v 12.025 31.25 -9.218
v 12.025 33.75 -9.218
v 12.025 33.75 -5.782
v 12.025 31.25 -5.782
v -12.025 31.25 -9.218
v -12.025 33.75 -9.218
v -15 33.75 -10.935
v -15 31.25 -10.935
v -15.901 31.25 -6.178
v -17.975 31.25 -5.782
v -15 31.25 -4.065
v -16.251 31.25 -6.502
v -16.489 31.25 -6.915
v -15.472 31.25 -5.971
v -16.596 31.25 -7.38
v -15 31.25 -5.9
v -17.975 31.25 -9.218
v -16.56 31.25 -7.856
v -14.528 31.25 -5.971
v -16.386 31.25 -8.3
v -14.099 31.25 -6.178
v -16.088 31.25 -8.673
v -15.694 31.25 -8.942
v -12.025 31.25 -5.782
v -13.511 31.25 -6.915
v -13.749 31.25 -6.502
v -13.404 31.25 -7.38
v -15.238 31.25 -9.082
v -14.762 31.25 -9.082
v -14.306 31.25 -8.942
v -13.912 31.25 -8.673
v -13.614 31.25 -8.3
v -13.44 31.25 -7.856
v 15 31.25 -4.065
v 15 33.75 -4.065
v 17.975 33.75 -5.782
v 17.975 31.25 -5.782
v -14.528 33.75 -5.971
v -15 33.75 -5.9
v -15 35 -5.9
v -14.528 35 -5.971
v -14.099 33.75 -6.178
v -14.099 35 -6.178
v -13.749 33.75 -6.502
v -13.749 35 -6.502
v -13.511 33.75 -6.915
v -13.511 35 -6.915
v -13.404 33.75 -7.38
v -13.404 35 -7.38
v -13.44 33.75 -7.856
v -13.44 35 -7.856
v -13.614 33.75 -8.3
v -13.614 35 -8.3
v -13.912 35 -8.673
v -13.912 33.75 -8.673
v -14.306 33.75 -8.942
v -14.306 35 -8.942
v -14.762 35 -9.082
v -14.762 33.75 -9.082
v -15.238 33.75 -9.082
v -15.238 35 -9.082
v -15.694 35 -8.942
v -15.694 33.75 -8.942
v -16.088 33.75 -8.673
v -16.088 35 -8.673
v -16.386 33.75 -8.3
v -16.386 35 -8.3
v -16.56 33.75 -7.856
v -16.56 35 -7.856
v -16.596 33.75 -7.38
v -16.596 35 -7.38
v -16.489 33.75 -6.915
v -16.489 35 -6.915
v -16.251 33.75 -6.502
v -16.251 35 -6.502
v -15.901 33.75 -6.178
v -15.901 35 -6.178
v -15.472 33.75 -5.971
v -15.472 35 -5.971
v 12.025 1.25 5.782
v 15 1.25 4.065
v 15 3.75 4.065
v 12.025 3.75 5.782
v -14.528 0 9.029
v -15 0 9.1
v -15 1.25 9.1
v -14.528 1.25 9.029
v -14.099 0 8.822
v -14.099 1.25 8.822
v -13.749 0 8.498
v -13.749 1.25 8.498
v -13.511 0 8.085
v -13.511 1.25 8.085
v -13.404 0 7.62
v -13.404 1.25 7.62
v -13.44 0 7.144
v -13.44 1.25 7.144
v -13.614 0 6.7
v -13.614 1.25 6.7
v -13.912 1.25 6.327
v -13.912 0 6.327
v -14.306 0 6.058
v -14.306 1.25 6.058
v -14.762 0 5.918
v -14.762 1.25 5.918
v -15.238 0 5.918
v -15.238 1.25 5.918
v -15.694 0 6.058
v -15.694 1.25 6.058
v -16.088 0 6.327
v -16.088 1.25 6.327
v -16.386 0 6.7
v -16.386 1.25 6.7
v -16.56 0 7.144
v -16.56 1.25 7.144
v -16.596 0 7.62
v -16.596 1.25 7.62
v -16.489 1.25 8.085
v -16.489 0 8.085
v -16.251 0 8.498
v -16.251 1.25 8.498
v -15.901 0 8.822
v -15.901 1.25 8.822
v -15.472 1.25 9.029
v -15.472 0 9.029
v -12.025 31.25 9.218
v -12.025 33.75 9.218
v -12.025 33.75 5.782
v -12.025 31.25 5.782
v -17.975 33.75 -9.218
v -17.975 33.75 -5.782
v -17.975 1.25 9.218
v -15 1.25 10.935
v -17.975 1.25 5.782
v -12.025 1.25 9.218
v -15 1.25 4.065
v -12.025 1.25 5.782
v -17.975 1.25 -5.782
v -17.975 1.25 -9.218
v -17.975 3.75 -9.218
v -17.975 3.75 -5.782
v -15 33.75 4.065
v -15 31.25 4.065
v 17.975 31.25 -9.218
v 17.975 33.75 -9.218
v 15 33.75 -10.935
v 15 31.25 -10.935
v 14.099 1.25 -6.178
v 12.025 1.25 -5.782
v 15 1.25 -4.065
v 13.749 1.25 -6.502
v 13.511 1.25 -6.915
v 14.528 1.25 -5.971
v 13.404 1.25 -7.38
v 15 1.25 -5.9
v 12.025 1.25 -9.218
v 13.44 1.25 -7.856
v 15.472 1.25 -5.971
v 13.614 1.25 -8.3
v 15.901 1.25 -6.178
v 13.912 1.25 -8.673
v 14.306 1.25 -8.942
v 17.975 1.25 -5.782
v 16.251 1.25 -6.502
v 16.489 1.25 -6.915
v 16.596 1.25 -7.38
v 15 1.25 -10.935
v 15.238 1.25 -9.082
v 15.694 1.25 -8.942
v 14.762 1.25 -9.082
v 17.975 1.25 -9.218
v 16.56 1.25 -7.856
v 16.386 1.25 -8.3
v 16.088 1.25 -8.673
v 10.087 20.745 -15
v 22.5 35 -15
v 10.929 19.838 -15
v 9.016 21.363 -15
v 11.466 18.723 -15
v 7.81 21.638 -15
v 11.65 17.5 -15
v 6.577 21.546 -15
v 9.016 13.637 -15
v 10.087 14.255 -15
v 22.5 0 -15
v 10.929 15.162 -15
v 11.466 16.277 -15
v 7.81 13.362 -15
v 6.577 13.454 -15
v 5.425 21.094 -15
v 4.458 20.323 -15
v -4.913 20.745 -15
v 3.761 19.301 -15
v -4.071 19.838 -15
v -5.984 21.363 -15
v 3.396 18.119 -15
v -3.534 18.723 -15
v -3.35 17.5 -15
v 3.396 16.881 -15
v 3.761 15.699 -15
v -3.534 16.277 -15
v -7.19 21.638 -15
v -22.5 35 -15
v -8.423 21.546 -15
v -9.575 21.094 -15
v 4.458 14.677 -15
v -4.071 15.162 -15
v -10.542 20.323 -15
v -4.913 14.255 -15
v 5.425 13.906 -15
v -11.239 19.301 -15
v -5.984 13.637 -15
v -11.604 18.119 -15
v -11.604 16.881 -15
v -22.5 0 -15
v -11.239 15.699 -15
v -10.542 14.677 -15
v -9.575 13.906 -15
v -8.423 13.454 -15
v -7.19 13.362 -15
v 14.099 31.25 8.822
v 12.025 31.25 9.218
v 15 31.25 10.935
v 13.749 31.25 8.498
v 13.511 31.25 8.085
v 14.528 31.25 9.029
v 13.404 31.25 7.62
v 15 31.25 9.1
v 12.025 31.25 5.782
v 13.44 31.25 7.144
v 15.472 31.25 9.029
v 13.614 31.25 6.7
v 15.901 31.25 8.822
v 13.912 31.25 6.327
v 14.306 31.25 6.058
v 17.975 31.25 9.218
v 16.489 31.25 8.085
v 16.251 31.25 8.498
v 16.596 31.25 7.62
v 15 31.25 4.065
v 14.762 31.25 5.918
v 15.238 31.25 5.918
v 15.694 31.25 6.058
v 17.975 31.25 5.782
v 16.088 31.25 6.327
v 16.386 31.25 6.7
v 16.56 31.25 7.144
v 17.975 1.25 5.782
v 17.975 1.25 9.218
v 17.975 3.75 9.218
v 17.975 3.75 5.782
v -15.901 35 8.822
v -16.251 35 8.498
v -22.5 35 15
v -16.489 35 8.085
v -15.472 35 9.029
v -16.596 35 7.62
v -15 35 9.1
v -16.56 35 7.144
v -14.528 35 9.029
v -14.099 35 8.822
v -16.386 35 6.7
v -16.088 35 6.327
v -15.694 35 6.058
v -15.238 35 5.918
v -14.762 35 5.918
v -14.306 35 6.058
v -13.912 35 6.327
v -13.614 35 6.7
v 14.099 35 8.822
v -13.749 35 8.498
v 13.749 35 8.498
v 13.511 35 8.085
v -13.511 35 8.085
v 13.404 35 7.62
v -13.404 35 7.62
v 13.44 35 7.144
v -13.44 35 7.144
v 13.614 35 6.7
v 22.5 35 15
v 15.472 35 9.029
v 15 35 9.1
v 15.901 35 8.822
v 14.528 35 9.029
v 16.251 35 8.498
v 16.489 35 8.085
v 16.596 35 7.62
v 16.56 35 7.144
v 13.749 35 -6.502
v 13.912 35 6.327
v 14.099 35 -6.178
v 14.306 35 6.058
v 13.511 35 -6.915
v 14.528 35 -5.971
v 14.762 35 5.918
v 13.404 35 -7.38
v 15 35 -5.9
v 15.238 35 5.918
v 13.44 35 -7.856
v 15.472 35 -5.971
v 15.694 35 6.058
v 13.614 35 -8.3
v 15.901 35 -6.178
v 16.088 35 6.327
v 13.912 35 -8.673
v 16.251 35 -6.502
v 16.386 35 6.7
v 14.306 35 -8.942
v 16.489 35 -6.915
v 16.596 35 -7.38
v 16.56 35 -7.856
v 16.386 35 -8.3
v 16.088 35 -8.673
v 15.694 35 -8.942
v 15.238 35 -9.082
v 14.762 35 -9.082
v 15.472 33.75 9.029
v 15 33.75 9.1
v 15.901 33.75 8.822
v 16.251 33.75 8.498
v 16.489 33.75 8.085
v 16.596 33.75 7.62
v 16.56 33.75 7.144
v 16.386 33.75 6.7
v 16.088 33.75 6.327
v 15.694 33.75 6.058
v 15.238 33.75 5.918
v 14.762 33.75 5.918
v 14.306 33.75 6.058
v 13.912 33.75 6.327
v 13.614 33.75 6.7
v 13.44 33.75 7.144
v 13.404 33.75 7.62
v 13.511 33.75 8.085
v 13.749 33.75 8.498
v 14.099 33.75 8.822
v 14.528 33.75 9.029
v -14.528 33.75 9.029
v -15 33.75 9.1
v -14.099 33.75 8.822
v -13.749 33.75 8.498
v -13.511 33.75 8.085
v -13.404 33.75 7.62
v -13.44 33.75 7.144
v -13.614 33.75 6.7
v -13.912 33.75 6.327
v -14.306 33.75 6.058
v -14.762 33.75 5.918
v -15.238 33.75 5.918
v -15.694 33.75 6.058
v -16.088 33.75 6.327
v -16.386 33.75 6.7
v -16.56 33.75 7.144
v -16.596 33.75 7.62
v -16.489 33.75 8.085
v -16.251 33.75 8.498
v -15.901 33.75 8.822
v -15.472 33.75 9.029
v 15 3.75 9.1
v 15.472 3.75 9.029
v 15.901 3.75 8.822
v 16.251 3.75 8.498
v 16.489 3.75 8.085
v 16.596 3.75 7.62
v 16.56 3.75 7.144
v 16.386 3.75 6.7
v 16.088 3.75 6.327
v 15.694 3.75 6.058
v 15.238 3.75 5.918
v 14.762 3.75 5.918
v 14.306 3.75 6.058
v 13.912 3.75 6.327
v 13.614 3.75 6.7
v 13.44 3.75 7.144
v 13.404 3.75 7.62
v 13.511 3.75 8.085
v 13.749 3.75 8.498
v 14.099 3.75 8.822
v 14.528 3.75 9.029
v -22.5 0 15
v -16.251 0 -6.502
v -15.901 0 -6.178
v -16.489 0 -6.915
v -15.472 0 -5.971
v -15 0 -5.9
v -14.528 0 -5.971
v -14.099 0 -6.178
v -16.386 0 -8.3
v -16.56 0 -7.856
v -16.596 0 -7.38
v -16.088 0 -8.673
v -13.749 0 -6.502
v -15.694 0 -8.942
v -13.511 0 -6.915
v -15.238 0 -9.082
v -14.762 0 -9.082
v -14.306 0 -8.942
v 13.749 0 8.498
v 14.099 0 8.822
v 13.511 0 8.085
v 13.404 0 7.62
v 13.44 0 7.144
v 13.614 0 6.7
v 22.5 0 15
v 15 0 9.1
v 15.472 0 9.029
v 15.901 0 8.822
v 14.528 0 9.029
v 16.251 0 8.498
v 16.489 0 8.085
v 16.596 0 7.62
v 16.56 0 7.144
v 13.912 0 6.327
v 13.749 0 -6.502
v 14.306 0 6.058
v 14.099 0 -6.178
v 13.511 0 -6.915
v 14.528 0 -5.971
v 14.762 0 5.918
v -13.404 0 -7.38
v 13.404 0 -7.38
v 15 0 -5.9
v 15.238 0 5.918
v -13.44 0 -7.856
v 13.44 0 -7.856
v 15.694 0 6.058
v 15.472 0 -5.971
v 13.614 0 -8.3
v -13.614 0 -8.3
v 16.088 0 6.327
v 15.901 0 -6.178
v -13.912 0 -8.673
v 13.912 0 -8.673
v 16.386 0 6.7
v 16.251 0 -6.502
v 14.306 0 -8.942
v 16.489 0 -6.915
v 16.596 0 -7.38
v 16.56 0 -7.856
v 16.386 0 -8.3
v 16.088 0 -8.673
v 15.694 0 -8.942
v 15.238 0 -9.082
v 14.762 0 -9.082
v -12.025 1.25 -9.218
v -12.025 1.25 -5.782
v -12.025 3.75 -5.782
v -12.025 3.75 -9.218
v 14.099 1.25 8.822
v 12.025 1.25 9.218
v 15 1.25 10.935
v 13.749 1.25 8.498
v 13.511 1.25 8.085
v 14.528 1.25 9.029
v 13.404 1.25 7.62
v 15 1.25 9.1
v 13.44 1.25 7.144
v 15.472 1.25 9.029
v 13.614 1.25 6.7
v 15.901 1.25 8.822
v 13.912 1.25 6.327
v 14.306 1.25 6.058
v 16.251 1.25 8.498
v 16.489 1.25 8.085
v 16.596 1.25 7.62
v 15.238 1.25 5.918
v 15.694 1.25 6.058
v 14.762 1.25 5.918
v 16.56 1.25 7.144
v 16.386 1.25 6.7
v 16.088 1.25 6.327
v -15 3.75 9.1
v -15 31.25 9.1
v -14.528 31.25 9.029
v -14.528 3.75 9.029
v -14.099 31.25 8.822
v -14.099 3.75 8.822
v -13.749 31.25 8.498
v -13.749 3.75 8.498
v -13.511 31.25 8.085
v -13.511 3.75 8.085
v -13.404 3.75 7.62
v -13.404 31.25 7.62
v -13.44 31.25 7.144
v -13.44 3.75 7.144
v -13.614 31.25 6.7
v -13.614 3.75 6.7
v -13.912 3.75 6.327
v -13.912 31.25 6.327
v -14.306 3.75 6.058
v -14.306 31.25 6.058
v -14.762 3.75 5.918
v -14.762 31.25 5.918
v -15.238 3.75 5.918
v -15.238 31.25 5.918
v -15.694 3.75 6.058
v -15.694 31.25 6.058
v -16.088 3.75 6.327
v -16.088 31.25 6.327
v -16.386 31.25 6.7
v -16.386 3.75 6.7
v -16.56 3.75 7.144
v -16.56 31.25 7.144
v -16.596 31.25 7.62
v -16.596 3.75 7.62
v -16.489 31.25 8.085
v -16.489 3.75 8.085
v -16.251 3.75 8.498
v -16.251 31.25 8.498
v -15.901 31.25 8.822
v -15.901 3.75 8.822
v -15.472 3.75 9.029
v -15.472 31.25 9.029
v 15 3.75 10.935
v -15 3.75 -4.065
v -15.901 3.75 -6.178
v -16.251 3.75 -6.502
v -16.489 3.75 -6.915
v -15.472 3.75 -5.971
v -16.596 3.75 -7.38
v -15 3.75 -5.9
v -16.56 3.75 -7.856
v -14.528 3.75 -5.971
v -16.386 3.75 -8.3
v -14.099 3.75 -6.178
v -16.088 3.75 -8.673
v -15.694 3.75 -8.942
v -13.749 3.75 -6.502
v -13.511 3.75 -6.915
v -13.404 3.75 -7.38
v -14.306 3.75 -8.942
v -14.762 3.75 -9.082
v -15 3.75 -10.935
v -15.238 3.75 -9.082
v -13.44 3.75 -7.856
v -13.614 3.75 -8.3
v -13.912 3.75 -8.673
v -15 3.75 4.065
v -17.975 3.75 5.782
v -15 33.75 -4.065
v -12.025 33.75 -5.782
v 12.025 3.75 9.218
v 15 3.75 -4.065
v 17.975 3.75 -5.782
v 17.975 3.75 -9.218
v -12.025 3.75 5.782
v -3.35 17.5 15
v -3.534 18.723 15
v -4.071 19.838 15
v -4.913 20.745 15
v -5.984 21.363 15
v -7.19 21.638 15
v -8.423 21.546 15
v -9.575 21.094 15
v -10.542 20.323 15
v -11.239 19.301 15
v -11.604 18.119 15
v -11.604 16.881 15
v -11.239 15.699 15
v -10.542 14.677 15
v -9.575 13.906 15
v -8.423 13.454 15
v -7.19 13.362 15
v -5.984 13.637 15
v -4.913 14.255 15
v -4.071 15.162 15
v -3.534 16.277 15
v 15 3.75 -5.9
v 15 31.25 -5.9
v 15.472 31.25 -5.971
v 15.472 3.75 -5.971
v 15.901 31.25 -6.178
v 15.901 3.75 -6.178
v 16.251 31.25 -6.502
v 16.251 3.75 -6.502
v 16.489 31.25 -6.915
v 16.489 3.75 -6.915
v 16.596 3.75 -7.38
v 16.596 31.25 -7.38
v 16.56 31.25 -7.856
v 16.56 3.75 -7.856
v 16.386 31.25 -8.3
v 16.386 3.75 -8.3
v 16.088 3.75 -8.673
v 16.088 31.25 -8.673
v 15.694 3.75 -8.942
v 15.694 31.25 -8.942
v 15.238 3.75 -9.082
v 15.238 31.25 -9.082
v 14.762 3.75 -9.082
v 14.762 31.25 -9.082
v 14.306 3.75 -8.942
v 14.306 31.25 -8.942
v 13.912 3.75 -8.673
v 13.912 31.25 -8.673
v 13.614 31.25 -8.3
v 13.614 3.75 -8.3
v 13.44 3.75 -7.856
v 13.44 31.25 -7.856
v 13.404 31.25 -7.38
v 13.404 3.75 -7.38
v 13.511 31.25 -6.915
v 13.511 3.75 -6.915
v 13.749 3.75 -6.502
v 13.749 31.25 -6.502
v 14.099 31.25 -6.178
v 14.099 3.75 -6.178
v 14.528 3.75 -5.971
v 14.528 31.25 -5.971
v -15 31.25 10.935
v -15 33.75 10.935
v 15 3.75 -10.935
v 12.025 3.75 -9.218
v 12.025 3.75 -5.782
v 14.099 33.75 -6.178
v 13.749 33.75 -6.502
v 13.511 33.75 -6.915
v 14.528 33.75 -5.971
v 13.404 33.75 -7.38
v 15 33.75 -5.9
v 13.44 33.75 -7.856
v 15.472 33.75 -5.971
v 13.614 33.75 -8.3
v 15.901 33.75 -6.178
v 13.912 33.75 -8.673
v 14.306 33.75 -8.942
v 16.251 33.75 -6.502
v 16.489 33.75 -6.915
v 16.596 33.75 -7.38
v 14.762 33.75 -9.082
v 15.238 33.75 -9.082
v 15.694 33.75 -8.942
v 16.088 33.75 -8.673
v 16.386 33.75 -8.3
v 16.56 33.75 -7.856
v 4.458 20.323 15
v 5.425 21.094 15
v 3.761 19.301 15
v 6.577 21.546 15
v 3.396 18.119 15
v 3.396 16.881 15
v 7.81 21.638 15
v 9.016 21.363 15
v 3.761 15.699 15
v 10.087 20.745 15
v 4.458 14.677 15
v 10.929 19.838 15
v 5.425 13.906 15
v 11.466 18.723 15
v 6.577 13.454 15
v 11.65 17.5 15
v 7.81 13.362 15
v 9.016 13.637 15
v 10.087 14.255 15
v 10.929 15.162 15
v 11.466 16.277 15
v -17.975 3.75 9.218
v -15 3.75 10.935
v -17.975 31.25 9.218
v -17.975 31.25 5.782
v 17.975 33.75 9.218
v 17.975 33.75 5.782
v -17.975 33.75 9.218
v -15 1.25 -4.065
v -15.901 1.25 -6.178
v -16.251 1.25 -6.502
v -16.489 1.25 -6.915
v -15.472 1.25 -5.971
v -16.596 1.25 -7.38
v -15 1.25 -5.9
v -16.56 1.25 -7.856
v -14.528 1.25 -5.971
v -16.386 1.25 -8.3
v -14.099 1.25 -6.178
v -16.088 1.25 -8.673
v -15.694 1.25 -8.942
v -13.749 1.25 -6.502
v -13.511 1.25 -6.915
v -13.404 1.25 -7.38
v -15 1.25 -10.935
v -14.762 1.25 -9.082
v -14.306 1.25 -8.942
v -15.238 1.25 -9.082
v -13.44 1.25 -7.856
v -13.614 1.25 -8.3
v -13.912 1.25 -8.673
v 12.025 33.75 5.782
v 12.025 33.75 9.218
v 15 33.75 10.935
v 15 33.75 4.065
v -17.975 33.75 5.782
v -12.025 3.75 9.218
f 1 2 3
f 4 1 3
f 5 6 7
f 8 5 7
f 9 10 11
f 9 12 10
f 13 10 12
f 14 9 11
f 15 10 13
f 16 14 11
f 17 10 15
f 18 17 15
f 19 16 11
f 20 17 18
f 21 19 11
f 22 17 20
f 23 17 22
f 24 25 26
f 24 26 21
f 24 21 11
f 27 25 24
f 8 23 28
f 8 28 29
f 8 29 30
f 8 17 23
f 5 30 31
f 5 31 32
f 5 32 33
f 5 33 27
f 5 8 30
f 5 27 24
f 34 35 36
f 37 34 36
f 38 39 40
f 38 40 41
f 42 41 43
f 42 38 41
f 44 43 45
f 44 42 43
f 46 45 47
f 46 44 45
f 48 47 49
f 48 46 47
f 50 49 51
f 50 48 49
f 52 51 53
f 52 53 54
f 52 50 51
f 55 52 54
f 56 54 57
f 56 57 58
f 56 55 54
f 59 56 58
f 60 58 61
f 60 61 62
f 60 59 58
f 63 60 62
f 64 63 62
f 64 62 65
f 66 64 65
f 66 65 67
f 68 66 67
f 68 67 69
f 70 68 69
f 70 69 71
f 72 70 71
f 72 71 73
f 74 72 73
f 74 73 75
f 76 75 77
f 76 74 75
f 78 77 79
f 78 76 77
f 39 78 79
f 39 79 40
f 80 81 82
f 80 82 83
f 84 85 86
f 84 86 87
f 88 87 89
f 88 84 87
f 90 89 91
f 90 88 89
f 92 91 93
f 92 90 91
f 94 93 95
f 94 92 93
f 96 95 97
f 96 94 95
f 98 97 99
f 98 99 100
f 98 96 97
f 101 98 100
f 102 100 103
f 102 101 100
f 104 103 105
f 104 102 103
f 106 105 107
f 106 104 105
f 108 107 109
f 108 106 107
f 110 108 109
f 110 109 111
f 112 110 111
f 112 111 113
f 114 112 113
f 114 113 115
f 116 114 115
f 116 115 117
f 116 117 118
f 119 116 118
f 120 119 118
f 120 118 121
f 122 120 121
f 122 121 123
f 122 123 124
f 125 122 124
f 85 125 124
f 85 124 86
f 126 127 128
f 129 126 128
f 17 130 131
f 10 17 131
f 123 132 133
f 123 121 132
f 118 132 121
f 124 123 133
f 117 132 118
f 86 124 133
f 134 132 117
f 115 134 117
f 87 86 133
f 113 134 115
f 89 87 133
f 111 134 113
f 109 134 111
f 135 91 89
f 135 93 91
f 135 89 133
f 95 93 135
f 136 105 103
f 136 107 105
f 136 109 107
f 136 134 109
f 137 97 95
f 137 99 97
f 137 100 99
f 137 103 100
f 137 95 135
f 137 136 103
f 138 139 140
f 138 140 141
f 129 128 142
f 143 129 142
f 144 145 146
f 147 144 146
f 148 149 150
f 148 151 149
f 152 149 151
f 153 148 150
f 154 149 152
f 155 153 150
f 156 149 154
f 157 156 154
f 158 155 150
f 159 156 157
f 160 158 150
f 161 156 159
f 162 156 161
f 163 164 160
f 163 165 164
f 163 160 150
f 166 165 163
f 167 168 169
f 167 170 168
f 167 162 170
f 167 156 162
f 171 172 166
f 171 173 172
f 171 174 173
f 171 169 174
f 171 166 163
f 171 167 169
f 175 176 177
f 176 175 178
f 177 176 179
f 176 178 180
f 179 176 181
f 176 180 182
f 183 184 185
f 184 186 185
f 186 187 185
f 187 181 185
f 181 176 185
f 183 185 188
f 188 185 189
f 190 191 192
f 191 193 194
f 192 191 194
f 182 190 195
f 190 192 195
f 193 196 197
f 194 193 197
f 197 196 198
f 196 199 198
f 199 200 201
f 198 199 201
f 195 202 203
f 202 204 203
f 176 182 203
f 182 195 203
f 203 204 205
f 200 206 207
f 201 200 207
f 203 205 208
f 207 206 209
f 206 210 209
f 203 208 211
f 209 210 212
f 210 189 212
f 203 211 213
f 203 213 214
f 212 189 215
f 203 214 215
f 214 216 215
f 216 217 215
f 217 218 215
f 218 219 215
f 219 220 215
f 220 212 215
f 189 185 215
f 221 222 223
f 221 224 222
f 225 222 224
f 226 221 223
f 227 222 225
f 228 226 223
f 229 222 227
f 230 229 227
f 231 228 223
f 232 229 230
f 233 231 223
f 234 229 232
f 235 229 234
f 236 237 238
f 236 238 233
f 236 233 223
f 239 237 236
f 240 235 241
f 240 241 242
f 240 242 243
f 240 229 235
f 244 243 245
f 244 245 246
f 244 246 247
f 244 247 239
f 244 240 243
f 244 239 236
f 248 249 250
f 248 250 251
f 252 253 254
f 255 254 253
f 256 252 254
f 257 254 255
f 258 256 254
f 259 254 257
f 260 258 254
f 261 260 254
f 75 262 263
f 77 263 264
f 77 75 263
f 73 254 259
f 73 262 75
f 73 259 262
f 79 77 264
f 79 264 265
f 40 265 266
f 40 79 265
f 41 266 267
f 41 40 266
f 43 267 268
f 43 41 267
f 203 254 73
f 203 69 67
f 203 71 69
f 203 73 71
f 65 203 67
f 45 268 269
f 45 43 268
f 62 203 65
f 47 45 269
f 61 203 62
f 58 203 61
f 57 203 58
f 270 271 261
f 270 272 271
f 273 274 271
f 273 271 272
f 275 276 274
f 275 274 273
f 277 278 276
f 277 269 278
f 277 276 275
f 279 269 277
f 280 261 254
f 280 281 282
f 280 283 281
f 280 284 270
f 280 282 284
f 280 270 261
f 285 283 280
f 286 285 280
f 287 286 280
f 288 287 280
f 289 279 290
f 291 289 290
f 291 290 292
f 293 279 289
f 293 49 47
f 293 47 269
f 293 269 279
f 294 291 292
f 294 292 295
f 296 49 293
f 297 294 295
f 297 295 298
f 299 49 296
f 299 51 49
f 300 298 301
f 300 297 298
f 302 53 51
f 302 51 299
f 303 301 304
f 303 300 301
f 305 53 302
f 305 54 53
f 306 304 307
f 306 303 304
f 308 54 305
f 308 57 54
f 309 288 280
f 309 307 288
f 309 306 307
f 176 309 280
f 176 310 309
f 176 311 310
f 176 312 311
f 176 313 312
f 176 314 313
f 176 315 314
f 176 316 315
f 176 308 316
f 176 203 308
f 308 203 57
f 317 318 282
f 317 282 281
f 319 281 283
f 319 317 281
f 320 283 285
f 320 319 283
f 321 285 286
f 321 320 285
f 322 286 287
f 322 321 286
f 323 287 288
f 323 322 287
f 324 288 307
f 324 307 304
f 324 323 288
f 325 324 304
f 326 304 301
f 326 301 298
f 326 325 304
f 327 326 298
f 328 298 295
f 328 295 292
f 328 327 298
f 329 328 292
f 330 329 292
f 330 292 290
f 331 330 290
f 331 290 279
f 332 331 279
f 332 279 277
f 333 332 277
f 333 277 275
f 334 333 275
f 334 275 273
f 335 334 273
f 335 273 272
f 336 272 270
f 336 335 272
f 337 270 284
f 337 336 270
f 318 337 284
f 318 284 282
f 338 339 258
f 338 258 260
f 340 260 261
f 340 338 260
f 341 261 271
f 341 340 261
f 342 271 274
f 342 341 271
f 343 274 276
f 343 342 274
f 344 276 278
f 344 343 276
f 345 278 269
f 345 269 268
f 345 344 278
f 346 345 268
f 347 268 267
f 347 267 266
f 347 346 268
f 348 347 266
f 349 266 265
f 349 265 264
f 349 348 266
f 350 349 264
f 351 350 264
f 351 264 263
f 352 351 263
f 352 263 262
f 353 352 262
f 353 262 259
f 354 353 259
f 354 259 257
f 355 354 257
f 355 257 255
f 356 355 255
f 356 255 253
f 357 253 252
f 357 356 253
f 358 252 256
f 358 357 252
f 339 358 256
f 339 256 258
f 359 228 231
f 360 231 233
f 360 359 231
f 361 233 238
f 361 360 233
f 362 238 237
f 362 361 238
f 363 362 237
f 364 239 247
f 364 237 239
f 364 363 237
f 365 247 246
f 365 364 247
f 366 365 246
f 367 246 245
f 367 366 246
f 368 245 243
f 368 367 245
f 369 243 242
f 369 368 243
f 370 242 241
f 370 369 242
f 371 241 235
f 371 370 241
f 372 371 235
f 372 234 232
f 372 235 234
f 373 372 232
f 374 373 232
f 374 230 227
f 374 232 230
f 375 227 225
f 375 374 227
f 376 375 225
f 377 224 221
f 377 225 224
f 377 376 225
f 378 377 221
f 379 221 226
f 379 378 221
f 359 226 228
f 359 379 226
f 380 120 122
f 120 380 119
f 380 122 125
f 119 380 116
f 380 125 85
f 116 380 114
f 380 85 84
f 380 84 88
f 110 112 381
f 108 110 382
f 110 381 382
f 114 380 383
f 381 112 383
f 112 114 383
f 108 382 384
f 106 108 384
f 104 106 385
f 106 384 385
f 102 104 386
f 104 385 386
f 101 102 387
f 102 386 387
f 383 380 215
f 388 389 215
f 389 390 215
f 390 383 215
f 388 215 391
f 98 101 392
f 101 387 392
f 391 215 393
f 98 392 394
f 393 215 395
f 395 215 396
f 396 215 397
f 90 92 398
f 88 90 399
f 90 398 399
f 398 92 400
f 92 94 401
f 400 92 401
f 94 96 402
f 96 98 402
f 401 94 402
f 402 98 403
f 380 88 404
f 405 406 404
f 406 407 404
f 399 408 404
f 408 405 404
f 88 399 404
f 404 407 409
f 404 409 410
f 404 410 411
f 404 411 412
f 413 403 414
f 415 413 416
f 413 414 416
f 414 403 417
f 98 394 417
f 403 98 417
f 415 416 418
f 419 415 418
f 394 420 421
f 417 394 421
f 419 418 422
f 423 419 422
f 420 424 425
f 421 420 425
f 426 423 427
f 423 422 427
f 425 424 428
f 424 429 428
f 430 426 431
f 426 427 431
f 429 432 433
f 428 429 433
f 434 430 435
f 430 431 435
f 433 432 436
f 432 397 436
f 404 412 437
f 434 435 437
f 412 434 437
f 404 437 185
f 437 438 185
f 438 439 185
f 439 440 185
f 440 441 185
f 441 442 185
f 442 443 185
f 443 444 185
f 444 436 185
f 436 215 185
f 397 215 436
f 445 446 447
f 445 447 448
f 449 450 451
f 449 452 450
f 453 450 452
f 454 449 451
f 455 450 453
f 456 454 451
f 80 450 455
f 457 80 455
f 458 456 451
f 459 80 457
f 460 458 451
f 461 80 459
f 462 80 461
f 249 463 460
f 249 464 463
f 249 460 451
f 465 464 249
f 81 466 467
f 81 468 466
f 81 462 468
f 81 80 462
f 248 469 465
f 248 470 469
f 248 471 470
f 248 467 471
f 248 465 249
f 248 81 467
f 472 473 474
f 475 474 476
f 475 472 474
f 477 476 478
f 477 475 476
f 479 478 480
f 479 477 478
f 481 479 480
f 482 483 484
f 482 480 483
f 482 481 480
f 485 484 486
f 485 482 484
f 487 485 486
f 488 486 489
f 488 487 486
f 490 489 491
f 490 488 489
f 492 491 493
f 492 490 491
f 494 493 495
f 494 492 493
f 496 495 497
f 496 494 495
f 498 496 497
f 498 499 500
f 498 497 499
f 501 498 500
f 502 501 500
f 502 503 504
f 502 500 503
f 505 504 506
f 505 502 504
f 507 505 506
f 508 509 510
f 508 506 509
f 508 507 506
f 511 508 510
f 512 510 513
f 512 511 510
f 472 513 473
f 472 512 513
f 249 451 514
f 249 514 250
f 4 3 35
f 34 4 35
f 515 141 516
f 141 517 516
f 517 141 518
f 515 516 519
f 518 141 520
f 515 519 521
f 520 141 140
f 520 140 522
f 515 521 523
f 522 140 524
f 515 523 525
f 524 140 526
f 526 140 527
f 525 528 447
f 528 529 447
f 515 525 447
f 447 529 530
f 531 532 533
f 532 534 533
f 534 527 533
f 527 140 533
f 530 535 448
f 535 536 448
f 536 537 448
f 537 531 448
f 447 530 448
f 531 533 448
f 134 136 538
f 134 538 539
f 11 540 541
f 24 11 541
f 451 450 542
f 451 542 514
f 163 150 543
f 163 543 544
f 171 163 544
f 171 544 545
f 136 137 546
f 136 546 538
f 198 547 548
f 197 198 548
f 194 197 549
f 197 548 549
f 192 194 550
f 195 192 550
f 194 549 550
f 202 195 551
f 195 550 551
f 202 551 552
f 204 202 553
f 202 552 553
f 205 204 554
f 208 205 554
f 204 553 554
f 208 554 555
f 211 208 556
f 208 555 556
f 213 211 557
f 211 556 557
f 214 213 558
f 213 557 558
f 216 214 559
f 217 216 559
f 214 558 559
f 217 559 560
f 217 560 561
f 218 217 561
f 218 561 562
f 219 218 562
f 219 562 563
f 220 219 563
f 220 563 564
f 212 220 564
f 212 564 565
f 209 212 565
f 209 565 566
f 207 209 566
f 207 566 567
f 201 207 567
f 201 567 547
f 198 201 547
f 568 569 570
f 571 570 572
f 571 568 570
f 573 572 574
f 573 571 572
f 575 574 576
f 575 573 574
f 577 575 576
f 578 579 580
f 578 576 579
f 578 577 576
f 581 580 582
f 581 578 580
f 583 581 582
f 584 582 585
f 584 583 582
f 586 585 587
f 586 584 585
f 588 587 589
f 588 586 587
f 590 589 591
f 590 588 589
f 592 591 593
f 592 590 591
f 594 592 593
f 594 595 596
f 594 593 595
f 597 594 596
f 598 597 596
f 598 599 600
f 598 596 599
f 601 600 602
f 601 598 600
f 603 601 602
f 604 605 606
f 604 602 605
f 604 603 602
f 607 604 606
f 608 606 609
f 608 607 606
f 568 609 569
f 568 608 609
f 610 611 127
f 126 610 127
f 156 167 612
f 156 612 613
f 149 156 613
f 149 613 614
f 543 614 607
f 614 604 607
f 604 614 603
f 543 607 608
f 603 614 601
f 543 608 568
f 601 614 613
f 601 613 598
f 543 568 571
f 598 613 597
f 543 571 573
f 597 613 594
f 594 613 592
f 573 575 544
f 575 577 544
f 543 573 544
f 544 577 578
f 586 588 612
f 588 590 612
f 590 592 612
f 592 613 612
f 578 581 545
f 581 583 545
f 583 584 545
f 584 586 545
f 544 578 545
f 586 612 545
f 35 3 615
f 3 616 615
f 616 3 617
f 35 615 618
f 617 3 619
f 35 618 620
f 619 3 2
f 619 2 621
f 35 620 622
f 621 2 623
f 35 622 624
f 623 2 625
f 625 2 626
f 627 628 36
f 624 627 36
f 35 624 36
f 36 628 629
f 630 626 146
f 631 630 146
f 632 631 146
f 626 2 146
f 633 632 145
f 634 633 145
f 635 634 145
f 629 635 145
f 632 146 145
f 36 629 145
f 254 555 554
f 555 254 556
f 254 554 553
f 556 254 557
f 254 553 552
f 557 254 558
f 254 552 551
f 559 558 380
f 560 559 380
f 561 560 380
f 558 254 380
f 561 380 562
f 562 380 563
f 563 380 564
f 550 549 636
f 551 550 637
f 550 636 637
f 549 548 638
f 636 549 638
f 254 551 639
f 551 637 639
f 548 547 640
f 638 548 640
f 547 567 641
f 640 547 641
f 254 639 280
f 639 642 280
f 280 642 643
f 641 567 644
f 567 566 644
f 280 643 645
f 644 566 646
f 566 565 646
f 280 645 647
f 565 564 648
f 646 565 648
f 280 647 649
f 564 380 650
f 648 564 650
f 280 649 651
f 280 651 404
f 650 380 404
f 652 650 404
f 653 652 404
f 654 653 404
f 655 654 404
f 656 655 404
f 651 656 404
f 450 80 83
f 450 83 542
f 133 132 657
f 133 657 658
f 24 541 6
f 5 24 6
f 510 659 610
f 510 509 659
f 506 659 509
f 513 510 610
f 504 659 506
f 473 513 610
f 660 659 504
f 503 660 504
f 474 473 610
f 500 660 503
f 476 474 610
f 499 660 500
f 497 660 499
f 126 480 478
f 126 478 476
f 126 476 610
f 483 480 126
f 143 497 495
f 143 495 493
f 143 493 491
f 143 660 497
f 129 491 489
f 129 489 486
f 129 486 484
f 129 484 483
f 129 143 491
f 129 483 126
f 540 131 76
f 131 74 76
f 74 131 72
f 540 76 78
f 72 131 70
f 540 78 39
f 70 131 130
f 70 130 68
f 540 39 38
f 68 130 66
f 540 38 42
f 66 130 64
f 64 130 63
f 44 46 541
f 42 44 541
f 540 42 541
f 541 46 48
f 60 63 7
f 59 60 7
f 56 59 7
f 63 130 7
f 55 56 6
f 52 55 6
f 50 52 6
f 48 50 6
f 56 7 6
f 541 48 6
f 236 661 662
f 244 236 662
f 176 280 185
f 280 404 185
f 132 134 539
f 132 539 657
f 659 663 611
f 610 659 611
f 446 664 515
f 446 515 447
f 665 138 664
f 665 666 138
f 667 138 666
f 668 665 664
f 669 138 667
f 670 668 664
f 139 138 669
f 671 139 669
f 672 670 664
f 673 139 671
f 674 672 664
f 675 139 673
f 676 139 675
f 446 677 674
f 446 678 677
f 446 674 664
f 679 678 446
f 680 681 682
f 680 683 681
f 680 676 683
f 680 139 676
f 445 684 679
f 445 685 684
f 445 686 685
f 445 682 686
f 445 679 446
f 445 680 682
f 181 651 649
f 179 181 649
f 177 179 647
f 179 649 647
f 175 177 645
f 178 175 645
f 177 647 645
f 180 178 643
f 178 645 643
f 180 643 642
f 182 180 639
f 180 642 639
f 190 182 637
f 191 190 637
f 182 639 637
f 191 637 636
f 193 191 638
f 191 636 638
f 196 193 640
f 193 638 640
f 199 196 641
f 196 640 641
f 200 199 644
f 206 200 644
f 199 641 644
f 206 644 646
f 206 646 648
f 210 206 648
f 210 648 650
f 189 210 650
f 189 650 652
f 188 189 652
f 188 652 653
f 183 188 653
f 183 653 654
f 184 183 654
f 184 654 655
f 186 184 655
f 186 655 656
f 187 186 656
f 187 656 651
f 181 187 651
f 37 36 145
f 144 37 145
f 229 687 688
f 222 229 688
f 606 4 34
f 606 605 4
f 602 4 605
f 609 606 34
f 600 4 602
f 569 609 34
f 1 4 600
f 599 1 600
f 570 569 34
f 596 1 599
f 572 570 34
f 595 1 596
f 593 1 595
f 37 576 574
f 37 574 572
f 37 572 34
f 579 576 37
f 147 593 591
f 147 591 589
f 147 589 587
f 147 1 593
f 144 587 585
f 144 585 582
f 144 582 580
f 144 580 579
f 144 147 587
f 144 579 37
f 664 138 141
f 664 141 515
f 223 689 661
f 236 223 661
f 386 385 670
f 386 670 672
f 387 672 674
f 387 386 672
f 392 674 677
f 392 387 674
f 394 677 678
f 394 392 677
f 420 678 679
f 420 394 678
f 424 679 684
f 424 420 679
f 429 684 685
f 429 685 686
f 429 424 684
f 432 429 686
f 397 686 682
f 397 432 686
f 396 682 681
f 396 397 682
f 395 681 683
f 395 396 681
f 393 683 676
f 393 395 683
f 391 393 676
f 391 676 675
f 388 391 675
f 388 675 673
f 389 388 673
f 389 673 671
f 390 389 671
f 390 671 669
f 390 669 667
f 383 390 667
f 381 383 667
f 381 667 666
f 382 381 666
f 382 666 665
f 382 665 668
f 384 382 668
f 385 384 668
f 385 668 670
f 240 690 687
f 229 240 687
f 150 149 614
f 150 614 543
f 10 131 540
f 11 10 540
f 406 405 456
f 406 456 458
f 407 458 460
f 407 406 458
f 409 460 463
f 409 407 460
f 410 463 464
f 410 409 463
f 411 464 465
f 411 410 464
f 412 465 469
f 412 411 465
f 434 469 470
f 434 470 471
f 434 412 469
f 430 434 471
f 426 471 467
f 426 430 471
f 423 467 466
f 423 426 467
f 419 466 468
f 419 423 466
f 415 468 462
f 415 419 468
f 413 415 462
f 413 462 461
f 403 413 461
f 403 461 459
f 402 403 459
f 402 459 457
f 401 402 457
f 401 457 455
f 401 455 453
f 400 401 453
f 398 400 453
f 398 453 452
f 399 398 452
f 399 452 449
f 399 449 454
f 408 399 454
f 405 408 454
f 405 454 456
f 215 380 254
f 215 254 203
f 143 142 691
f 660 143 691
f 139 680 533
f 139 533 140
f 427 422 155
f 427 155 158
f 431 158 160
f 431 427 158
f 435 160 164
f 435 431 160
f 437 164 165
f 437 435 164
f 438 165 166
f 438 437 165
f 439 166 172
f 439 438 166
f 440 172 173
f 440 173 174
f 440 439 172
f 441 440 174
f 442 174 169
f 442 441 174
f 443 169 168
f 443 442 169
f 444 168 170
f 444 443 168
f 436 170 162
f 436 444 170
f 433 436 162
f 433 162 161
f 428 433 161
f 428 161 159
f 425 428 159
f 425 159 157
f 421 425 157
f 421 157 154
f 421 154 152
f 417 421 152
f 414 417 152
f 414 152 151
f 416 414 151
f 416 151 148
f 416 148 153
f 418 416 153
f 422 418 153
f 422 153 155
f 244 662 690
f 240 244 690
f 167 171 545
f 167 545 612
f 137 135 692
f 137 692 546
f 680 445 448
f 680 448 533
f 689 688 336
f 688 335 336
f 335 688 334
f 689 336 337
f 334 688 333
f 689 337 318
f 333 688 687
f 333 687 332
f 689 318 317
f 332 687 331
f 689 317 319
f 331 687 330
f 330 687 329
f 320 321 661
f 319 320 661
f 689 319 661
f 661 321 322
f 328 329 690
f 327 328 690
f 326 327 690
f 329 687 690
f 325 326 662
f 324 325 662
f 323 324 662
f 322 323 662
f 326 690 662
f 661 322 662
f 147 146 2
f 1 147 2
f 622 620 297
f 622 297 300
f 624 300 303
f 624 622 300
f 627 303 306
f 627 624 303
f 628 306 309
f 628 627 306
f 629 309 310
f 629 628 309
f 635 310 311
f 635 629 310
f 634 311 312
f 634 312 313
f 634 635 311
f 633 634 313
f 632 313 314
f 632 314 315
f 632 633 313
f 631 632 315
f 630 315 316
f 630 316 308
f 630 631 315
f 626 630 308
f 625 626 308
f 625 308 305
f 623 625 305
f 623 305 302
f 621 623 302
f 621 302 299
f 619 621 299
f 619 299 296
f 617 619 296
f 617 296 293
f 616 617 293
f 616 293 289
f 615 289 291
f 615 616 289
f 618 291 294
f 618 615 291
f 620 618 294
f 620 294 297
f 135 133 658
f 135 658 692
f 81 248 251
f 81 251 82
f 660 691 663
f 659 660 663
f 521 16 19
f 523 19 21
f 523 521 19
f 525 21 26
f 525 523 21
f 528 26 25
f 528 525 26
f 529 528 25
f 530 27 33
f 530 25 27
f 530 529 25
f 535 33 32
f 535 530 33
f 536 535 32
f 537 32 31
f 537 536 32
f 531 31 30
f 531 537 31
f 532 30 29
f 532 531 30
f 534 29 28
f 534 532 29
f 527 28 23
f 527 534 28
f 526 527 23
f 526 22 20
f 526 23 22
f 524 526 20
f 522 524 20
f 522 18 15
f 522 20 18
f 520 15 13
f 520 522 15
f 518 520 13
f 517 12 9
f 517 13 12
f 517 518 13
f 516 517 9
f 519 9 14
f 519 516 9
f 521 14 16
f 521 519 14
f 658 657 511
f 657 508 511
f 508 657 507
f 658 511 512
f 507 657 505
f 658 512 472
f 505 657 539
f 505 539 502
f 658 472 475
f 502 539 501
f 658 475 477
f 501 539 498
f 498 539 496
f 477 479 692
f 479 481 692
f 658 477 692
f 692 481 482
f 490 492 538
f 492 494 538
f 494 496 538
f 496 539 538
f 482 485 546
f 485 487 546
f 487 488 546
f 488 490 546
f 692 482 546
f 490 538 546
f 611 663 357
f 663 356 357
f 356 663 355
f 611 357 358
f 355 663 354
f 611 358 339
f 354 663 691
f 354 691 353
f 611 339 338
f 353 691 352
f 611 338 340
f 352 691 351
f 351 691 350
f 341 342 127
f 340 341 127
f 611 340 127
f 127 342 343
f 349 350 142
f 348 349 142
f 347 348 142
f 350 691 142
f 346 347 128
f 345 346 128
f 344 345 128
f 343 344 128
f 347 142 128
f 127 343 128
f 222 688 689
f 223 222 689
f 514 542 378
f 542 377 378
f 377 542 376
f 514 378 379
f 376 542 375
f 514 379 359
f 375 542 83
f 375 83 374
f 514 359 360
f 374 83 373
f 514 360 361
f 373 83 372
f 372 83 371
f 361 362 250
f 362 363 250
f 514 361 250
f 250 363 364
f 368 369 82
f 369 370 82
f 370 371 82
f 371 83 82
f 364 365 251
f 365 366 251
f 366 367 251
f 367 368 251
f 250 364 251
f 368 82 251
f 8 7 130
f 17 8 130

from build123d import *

# Parameters (mm, degrees)
SKETCH1_W           = 15
SKETCH1_H           = 30
SKETCH1_R           = 1.6
BOSS_EXTRUDE1_DEPTH = 5
CUT_EXTRUDE1_START  = 1.25
SKETCH1_3_R         = 1.6
CUT_EXTRUDE1_DEPTH  = 2.5
BOSS_EXTRUDE2_START = 5
SKETCH1_4_W         = 15
SKETCH1_4_H         = 30
SKETCH1_4_R         = 1.6
BOSS_EXTRUDE2_DEPTH = 30
SKETCH5_R           = 4.15
CUT_EXTRUDE2_DEPTH  = 52.295711322
CUT_EXTRUDE3_START  = -1.25
CUT_EXTRUDE3_DEPTH  = 2.5


with BuildPart() as part:
    # Sketch1 → Boss-Extrude1 (new body)
    with BuildSketch(Plane(origin=(0, 0, 0), x_dir=(1, 0, 0), z_dir=(0, 1, 0))):
        with Locations((-15, 0)):
            Rectangle(SKETCH1_W, SKETCH1_H)
        Polygon((-12.025, -5.782382949), (-15, -4.064765898), (-17.975, -5.782382949), (-17.975, -9.217617051), (-15, -10.935234102), (-12.025, -9.217617051), align=None, mode=Mode.SUBTRACT)
        Polygon((-12.025, 9.217617051), (-15, 10.935234102), (-17.975, 9.217617051), (-17.975, 5.782382949), (-15, 4.064765898), (-12.025, 5.782382949), align=None, mode=Mode.SUBTRACT)
        Rectangle(SKETCH1_W, SKETCH1_H)
        with Locations((15, 0)):
            Rectangle(SKETCH1_W, SKETCH1_H)
        Polygon((17.975, -5.782382949), (15, -4.064765898), (12.025, -5.782382949), (12.025, -9.217617051), (15, -10.935234102), (17.975, -9.217617051), align=None, mode=Mode.SUBTRACT)
        Polygon((17.975, 9.217617051), (15, 10.935234102), (12.025, 9.217617051), (12.025, 5.782382949), (15, 4.064765898), (17.975, 5.782382949), align=None, mode=Mode.SUBTRACT)
        Polygon((-12.025, -9.217617051), (-12.025, -5.782382949), (-15, -4.064765898), (-17.975, -5.782382949), (-17.975, -9.217617051), (-15, -10.935234102), align=None)
        with Locations(Location((-15, -7.5, 0), (0, 0, 270))):
            Circle(SKETCH1_R, mode=Mode.SUBTRACT)
        Polygon((-12.025, 5.782382949), (-12.025, 9.217617051), (-15, 10.935234102), (-17.975, 9.217617051), (-17.975, 5.782382949), (-15, 4.064765898), align=None)
        with Locations(Location((-15, 7.5, 0), (0, 0, 270))):
            Circle(SKETCH1_R, mode=Mode.SUBTRACT)
        Polygon((17.975, 5.782382949), (17.975, 9.217617051), (15, 10.935234102), (12.025, 9.217617051), (12.025, 5.782382949), (15, 4.064765898), align=None)
        with Locations(Location((15, 7.5, 0), (0, 0, 270))):
            Circle(SKETCH1_R, mode=Mode.SUBTRACT)
        Polygon((17.975, -9.217617051), (17.975, -5.782382949), (15, -4.064765898), (12.025, -5.782382949), (12.025, -9.217617051), (15, -10.935234102), align=None)
        with Locations(Location((15, -7.5, 0), (0, 0, 270))):
            Circle(SKETCH1_R, mode=Mode.SUBTRACT)
    extrude(amount=BOSS_EXTRUDE1_DEPTH)

    # Sketch1<3> → Cut-Extrude1 (cut)
    with BuildSketch(Plane(origin=(0, 0, 0), x_dir=(1, 0, 0), z_dir=(0, 1, 0)).offset(CUT_EXTRUDE1_START)):
        Polygon((-12.025, 5.782382949), (-12.025, 9.217617051), (-15, 10.935234102), (-17.975, 9.217617051), (-17.975, 5.782382949), (-15, 4.064765898), align=None)
        with Locations(Location((-15, 7.5, 0), (0, 0, 270))):
            Circle(SKETCH1_3_R, mode=Mode.SUBTRACT)
        Polygon((-12.025, -9.217617051), (-12.025, -5.782382949), (-15, -4.064765898), (-17.975, -5.782382949), (-17.975, -9.217617051), (-15, -10.935234102), align=None)
        with Locations(Location((-15, -7.5, 0), (0, 0, 270))):
            Circle(SKETCH1_3_R, mode=Mode.SUBTRACT)
        Polygon((17.975, -9.217617051), (17.975, -5.782382949), (15, -4.064765898), (12.025, -5.782382949), (12.025, -9.217617051), (15, -10.935234102), align=None)
        with Locations(Location((15, -7.5, 0), (0, 0, 270))):
            Circle(SKETCH1_3_R, mode=Mode.SUBTRACT)
        Polygon((17.975, 5.782382949), (17.975, 9.217617051), (15, 10.935234102), (12.025, 9.217617051), (12.025, 5.782382949), (15, 4.064765898), align=None)
        with Locations(Location((15, 7.5, 0), (0, 0, 270))):
            Circle(SKETCH1_3_R, mode=Mode.SUBTRACT)
    extrude(amount=CUT_EXTRUDE1_DEPTH, mode=Mode.SUBTRACT)

    # Sketch1<4> → Boss-Extrude2 (add)
    with BuildSketch(Plane(origin=(0, 0, 0), x_dir=(1, 0, 0), z_dir=(0, 1, 0)).offset(BOSS_EXTRUDE2_START)):
        Rectangle(SKETCH1_4_W, SKETCH1_4_H)
        with Locations((-15, 0)):
            Rectangle(SKETCH1_4_W, SKETCH1_4_H)
        Polygon((-12.025, -5.782382949), (-15, -4.064765898), (-17.975, -5.782382949), (-17.975, -9.217617051), (-15, -10.935234102), (-12.025, -9.217617051), align=None, mode=Mode.SUBTRACT)
        Polygon((-12.025, 9.217617051), (-15, 10.935234102), (-17.975, 9.217617051), (-17.975, 5.782382949), (-15, 4.064765898), (-12.025, 5.782382949), align=None, mode=Mode.SUBTRACT)
        Polygon((-12.025, -9.217617051), (-12.025, -5.782382949), (-15, -4.064765898), (-17.975, -5.782382949), (-17.975, -9.217617051), (-15, -10.935234102), align=None)
        with Locations(Location((-15, -7.5, 0), (0, 0, 270))):
            Circle(SKETCH1_4_R, mode=Mode.SUBTRACT)
        Polygon((-12.025, 5.782382949), (-12.025, 9.217617051), (-15, 10.935234102), (-17.975, 9.217617051), (-17.975, 5.782382949), (-15, 4.064765898), align=None)
        with Locations(Location((-15, 7.5, 0), (0, 0, 270))):
            Circle(SKETCH1_4_R, mode=Mode.SUBTRACT)
        with Locations((15, 0)):
            Rectangle(SKETCH1_4_W, SKETCH1_4_H)
        Polygon((17.975, -5.782382949), (15, -4.064765898), (12.025, -5.782382949), (12.025, -9.217617051), (15, -10.935234102), (17.975, -9.217617051), align=None, mode=Mode.SUBTRACT)
        Polygon((17.975, 9.217617051), (15, 10.935234102), (12.025, 9.217617051), (12.025, 5.782382949), (15, 4.064765898), (17.975, 5.782382949), align=None, mode=Mode.SUBTRACT)
        Polygon((17.975, -9.217617051), (17.975, -5.782382949), (15, -4.064765898), (12.025, -5.782382949), (12.025, -9.217617051), (15, -10.935234102), align=None)
        with Locations(Location((15, -7.5, 0), (0, 0, 270))):
            Circle(SKETCH1_4_R, mode=Mode.SUBTRACT)
        Polygon((17.975, 5.782382949), (17.975, 9.217617051), (15, 10.935234102), (12.025, 9.217617051), (12.025, 5.782382949), (15, 4.064765898), align=None)
        with Locations(Location((15, 7.5, 0), (0, 0, 270))):
            Circle(SKETCH1_4_R, mode=Mode.SUBTRACT)
    extrude(amount=BOSS_EXTRUDE2_DEPTH)

    # Sketch5 → Cut-Extrude2 (cut, through all)
    with BuildSketch(Plane.XY.offset(15)):
        with Locations((-7.5, 17.5)):
            Circle(SKETCH5_R)
        with Locations((7.5, 17.5)):
            Circle(SKETCH5_R)
    extrude(amount=-CUT_EXTRUDE2_DEPTH, mode=Mode.SUBTRACT)

    # Sketch6 → Cut-Extrude3 (cut)
    with BuildSketch(Plane(origin=(0, 35, 0), x_dir=(1, 0, 0), z_dir=(0, 1, 0)).offset(CUT_EXTRUDE3_START)):
        Polygon((-15, 10.935234102), (-17.975, 9.217617051), (-17.975, 5.782382949), (-15, 4.064765898), (-12.025, 5.782382949), (-12.025, 9.217617051), align=None)
        Polygon((15, 10.935234102), (12.025, 9.217617051), (12.025, 5.782382949), (15, 4.064765898), (17.975, 5.782382949), (17.975, 9.217617051), align=None)
        Polygon((15, -4.064765898), (12.025, -5.782382949), (12.025, -9.217617051), (15, -10.935234102), (17.975, -9.217617051), (17.975, -5.782382949), align=None)
        Polygon((-15, -4.064765898), (-17.975, -5.782382949), (-17.975, -9.217617051), (-15, -10.935234102), (-12.025, -9.217617051), (-12.025, -5.782382949), align=None)
    extrude(amount=-CUT_EXTRUDE3_DEPTH, mode=Mode.SUBTRACT)


solid = part.part
